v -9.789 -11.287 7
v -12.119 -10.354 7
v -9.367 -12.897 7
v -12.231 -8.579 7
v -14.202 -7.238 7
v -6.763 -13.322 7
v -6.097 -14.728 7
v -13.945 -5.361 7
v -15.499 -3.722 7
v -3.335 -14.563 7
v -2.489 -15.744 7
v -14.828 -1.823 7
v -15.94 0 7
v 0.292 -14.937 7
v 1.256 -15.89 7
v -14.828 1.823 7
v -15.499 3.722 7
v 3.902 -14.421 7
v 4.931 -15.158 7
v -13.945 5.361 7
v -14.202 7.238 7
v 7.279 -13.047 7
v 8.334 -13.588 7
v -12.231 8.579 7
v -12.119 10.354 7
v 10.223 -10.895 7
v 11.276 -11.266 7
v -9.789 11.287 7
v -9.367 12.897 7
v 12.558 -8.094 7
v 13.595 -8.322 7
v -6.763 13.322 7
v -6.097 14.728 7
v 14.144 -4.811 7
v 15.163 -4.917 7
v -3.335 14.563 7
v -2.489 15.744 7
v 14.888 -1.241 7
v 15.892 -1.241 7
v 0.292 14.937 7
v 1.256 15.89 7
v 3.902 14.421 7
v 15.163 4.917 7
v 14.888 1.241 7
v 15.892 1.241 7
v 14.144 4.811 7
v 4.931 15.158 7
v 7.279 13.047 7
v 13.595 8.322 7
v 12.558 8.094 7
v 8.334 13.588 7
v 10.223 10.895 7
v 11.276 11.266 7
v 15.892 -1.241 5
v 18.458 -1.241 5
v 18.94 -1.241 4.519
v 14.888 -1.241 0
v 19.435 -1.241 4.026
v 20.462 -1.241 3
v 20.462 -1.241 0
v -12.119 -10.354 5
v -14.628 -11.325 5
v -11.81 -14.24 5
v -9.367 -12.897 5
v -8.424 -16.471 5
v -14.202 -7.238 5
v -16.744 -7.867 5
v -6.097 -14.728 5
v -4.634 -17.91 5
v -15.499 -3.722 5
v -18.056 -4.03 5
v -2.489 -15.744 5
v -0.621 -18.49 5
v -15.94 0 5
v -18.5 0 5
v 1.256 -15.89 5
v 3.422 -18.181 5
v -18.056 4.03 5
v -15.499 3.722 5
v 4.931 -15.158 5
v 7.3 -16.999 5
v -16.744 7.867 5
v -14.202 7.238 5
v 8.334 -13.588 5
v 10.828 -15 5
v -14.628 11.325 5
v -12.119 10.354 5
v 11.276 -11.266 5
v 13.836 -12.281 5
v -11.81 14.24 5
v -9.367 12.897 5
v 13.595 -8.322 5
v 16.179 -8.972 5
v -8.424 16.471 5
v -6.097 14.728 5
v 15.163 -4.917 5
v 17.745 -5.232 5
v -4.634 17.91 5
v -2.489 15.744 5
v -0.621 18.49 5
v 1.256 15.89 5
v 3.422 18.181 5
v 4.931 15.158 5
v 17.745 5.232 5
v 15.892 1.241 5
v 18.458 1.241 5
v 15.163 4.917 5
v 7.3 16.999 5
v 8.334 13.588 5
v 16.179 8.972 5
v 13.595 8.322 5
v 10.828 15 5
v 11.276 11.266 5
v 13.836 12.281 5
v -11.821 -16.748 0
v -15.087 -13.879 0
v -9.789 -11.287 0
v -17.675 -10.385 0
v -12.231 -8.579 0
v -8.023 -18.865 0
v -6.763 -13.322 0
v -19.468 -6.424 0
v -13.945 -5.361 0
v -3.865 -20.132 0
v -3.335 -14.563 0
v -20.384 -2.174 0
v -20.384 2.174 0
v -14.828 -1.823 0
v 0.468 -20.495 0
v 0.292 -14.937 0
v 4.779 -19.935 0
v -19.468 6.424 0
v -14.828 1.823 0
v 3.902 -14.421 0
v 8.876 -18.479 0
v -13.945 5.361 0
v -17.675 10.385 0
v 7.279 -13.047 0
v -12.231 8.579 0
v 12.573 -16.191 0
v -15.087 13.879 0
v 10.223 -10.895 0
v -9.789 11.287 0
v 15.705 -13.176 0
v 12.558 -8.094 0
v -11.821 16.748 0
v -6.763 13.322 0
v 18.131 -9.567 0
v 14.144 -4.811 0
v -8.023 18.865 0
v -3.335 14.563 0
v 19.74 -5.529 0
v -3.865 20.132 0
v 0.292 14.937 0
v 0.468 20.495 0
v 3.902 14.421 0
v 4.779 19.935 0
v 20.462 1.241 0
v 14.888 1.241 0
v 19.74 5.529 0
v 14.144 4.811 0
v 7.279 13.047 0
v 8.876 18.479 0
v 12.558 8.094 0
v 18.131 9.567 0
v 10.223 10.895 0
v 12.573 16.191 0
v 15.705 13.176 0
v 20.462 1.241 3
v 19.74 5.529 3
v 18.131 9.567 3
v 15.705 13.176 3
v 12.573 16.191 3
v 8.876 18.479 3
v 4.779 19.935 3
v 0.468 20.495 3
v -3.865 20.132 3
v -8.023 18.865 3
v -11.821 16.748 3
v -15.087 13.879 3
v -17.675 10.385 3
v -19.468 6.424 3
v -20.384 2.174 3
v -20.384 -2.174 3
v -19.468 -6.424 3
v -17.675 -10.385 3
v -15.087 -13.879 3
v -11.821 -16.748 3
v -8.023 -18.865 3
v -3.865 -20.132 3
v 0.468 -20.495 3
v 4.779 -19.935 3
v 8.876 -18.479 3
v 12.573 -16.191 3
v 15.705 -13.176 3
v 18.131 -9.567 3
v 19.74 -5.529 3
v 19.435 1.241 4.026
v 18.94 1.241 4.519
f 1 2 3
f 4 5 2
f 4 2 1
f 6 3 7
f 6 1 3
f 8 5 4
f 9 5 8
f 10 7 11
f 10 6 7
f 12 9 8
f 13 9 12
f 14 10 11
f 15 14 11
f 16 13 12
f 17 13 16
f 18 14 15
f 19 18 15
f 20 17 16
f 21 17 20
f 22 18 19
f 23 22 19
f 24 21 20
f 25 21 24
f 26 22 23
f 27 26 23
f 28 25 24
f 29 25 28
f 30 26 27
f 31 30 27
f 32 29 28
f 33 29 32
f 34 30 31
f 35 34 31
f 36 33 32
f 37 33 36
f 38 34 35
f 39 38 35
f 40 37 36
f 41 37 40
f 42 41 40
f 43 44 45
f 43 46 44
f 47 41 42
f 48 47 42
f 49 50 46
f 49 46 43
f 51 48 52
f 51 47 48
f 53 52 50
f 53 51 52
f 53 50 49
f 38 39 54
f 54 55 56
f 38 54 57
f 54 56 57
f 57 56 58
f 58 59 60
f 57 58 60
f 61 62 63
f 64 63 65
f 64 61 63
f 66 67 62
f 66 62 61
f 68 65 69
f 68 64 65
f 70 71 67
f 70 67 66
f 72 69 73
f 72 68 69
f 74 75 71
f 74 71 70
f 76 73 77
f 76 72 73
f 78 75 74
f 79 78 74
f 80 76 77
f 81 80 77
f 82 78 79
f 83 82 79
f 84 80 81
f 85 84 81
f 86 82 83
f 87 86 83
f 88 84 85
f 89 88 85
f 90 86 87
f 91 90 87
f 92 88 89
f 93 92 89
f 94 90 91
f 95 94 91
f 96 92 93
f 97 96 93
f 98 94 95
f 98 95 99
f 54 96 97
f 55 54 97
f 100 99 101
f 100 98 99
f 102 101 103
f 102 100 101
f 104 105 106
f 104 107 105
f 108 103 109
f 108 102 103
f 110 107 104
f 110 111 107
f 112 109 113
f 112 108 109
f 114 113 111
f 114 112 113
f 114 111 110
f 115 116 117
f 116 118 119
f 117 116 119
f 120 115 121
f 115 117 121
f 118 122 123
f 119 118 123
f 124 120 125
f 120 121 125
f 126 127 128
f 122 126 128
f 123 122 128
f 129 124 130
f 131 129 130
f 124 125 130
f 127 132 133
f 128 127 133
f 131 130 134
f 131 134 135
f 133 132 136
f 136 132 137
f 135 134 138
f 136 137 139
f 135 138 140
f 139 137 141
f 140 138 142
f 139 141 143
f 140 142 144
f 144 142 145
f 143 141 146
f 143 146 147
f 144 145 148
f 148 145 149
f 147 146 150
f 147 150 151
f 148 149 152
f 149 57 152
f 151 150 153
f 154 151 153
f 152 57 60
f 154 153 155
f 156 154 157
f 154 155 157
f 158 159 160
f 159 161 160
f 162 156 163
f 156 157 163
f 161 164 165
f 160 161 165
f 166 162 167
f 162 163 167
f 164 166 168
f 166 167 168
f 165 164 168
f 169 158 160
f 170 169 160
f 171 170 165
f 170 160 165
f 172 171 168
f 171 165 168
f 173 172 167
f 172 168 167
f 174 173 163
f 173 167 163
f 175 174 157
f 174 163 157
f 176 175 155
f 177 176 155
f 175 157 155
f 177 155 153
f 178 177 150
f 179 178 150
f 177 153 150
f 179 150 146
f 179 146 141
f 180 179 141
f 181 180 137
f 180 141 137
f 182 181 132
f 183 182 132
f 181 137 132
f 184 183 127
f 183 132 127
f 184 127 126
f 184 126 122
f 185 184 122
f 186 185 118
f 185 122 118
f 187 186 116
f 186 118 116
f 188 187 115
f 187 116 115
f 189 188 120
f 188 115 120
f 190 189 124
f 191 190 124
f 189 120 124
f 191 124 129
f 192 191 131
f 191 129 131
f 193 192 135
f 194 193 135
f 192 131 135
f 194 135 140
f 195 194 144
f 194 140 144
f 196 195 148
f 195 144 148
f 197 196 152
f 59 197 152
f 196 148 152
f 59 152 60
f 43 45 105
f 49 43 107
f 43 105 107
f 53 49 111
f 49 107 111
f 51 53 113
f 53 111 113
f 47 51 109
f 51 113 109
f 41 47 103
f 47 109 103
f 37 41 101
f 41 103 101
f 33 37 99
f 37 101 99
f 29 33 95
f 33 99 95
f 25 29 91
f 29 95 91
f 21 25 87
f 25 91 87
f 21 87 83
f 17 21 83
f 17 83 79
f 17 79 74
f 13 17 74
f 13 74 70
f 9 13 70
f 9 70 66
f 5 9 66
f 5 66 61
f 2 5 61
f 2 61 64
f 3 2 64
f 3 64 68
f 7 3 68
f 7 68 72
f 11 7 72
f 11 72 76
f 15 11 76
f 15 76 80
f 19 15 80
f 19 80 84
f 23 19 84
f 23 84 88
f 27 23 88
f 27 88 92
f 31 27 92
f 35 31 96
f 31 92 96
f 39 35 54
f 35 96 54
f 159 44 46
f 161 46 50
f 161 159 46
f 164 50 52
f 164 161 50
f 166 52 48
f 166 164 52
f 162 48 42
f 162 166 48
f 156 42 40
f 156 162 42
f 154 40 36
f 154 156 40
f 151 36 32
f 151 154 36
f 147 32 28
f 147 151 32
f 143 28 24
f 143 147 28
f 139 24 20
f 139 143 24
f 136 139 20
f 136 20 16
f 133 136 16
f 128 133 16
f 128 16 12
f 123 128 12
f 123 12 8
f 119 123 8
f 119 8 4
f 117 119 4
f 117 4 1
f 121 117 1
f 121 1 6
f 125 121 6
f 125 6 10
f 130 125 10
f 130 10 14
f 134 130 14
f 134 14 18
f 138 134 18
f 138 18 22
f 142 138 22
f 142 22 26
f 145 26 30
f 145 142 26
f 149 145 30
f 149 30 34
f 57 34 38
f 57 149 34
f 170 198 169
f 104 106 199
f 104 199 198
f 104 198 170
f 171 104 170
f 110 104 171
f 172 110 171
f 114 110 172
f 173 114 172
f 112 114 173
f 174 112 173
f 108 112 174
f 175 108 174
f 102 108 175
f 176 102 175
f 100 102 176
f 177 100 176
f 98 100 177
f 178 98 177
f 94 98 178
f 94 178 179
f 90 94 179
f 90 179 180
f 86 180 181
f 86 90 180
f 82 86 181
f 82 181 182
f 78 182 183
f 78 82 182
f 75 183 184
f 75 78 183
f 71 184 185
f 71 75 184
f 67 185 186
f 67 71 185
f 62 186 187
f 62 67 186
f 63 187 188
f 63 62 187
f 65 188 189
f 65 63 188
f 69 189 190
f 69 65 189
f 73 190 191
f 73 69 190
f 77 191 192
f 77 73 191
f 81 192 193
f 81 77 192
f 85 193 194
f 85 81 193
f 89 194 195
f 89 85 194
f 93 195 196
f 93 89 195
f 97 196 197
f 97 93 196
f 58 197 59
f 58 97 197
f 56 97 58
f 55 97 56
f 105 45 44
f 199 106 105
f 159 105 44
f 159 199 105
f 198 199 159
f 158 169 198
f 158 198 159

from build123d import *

# Parameters (mm, degrees)
SKETCH1_R           = 15.94
SKETCH1_R_2         = 14.94
BOSS_EXTRUDE1_DEPTH = 7
SKETCH1_3_R         = 20.5
SKETCH1_3_R_2       = 15.94
BOSS_EXTRUDE2_DEPTH = 5
CHAMFER1_SIZE       = 2
SKETCH2_W           = 8
SKETCH2_H           = 2.482498026
CUT_EXTRUDE1_DEPTH  = 13


with BuildPart() as part:
    # Sketch1 → Boss-Extrude1 (new body)
    with BuildSketch(Plane.XY):
        Circle(SKETCH1_R)
        Circle(SKETCH1_R_2, mode=Mode.SUBTRACT)
    extrude(amount=BOSS_EXTRUDE1_DEPTH)

    # Sketch1<3> → Boss-Extrude2 (add)
    with BuildSketch(Plane.XY):
        Circle(SKETCH1_3_R)
        Circle(SKETCH1_3_R_2, mode=Mode.SUBTRACT)
    extrude(amount=BOSS_EXTRUDE2_DEPTH)

    # Chamfer1
    chamfer1_edges = [part.edges().sort_by_distance(p)[0] for p in [
        (-20.5, 0, 5),
    ]]
    chamfer(chamfer1_edges, length=CHAMFER1_SIZE)

    # Sketch2 → Cut-Extrude1 (cut)
    with BuildSketch(Plane(origin=(20.5, 0, 0), x_dir=(0, 0, -1), z_dir=(1, 0, 0))):
        with Locations((-3, 0)):
            Rectangle(SKETCH2_W, SKETCH2_H)
    extrude(amount=-CUT_EXTRUDE1_DEPTH, mode=Mode.SUBTRACT)


solid = part.part
